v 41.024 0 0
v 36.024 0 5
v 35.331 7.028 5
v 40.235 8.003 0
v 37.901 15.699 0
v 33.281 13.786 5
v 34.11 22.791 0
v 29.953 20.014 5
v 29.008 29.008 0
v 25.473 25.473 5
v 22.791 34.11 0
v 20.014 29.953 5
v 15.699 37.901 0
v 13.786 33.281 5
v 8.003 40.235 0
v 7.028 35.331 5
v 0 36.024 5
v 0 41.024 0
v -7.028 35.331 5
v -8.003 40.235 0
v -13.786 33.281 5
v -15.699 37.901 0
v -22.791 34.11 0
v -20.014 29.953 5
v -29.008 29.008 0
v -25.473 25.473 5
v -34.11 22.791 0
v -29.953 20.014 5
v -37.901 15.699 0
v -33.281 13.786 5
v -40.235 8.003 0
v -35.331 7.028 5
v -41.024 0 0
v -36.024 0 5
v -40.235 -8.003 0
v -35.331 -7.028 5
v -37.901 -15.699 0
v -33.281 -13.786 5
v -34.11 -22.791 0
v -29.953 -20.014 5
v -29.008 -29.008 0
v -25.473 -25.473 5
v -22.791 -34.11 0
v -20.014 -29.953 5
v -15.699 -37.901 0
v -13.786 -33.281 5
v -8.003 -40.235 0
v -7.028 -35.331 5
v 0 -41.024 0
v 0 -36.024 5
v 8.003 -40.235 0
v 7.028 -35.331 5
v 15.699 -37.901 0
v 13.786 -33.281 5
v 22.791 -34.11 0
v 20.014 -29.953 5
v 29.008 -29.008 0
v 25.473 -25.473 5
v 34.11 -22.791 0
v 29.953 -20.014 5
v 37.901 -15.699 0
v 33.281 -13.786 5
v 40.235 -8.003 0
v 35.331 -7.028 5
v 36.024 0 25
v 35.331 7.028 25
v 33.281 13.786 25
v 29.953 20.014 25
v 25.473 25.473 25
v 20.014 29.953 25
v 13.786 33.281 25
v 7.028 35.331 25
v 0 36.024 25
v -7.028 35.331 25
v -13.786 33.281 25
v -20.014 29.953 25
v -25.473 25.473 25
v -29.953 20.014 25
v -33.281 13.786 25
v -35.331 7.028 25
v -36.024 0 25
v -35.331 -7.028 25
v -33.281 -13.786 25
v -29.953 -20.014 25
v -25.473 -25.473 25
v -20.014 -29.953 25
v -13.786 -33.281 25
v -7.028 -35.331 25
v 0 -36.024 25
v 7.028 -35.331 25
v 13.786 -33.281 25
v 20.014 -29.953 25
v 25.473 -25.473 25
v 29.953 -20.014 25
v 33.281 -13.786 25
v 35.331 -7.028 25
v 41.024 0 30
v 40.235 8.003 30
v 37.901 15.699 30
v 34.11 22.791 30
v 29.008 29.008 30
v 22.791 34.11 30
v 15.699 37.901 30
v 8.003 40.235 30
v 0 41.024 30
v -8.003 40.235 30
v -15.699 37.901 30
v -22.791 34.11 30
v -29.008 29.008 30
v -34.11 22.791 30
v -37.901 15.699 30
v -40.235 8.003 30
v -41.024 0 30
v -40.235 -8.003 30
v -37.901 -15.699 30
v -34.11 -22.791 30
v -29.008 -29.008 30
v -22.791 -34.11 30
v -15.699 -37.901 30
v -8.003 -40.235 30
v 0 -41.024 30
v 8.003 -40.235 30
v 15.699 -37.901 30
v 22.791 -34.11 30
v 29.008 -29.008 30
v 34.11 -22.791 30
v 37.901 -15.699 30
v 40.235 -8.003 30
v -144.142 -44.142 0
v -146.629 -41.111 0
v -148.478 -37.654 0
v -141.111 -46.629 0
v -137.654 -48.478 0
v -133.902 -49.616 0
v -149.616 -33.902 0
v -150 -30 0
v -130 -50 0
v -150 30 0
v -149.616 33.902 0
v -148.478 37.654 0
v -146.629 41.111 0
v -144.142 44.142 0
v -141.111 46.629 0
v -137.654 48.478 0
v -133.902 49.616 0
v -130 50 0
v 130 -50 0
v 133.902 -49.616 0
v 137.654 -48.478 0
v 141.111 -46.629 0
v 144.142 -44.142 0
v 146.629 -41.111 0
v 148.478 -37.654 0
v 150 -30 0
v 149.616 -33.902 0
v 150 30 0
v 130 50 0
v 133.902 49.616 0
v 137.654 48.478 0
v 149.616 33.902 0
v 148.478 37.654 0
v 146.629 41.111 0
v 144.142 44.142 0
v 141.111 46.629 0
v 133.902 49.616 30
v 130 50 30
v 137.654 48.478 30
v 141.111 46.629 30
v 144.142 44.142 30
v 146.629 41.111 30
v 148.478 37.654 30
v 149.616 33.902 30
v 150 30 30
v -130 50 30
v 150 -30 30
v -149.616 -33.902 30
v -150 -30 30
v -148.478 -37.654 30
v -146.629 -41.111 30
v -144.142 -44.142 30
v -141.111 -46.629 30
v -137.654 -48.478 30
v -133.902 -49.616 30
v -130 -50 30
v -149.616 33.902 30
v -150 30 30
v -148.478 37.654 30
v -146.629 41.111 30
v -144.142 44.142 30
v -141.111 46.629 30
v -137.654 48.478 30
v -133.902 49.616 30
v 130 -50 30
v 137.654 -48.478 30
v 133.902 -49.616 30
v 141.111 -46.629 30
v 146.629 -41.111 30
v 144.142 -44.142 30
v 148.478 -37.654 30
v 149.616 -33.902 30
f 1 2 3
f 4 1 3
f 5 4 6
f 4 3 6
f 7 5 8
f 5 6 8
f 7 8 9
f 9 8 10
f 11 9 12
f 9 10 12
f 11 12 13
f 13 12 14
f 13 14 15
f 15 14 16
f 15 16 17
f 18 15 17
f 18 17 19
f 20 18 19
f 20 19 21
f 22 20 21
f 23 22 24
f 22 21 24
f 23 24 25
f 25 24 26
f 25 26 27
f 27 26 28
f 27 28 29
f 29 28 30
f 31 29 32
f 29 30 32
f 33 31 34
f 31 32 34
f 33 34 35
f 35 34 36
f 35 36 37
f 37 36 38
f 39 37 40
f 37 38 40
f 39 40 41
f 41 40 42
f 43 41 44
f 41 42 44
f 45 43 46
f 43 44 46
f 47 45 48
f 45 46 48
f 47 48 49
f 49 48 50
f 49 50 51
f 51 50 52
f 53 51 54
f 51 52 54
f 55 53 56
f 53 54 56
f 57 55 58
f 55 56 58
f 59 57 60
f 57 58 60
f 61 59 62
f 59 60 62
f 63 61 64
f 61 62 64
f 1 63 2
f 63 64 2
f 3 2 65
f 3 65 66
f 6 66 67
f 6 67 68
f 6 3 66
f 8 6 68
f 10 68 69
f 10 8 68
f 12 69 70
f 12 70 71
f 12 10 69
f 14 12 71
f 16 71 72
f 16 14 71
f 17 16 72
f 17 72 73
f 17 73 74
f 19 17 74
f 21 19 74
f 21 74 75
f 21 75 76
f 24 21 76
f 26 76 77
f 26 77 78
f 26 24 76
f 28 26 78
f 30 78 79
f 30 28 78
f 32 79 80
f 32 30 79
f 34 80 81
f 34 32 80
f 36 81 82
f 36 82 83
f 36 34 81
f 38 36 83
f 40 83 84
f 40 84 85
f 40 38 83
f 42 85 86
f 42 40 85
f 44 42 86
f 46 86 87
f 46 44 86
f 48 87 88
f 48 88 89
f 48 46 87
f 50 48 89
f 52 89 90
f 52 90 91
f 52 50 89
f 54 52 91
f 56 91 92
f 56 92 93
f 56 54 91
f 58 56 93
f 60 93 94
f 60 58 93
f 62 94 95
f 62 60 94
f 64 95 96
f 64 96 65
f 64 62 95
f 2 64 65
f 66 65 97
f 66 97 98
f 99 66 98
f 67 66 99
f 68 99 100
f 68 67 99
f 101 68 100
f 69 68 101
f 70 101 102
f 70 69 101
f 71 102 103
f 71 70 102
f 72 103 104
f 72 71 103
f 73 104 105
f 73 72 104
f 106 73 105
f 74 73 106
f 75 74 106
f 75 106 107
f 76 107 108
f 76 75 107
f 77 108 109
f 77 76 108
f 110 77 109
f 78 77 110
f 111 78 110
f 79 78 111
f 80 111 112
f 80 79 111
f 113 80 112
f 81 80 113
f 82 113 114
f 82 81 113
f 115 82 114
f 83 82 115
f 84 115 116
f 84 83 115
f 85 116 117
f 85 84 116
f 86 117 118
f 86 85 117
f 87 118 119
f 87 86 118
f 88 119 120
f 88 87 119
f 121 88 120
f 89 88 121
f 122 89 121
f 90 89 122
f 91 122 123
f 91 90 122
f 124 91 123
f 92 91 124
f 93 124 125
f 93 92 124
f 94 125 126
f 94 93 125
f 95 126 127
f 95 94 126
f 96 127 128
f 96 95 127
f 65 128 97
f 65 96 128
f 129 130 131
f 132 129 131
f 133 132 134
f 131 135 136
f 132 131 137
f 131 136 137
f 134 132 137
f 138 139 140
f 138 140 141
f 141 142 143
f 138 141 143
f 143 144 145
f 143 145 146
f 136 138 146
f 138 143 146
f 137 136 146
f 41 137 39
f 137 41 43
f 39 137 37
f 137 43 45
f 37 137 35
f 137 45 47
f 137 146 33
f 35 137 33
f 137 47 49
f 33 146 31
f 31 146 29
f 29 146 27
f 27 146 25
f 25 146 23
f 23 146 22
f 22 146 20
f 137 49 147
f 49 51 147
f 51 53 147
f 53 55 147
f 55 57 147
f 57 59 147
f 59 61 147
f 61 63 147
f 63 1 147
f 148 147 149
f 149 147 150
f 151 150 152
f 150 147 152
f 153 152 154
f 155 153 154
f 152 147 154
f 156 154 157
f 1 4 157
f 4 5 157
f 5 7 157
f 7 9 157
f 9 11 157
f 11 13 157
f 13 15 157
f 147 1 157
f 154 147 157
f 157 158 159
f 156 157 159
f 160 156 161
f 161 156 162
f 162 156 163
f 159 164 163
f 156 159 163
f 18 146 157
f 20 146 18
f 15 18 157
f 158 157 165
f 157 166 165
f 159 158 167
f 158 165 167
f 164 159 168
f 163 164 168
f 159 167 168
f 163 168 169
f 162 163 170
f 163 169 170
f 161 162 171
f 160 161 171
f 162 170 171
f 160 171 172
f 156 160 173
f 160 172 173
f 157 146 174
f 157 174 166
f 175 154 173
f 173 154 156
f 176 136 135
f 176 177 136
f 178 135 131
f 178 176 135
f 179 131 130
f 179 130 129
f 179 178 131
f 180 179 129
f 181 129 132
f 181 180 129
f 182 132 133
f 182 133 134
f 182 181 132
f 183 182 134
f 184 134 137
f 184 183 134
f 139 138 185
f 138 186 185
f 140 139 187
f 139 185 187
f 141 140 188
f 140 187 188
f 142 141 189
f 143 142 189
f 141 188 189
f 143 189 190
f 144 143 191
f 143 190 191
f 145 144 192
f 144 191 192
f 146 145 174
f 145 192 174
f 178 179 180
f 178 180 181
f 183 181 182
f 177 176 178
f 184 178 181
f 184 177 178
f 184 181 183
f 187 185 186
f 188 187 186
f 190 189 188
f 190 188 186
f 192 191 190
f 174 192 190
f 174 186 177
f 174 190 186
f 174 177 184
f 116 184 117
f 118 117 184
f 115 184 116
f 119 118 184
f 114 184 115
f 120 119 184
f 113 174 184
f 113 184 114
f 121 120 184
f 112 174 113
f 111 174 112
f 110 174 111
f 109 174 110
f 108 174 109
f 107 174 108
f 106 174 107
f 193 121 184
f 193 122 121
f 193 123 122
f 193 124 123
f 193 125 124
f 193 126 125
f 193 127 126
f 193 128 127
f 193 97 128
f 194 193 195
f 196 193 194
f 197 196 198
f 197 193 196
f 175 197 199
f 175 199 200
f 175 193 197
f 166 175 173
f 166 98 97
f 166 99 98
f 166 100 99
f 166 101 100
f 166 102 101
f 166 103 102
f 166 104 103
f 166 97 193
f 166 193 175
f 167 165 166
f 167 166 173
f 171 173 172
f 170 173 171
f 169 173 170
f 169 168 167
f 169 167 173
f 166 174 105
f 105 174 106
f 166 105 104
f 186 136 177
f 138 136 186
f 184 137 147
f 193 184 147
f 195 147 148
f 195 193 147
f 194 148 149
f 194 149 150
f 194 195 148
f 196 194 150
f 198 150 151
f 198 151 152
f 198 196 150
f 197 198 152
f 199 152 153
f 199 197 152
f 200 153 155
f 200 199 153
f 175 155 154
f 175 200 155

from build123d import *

# Parameters (mm, degrees)
F0_W     = 300
F0_H     = 100
F0_R     = 36.023604
F1_DEPTH = 30
F2_R     = 20
F3_SIZE  = 5


with BuildPart() as f1:
    # F0 (on Top) → F1 (new body)
    with BuildSketch(Plane.XY):
        Rectangle(F0_W, F0_H)
        Circle(F0_R, mode=Mode.SUBTRACT)
    extrude(amount=F1_DEPTH)

    # F2
    f2_edges = [f1.edges().sort_by_distance(p)[0] for p in [
        (150, -50, 15),
        (150, 50, 15),
        (-150, -50, 15),
        (-150, 50, 15),
    ]]
    fillet(f2_edges, radius=F2_R)

    # F3
    f3_edges = [f1.edges().sort_by_distance(p)[0] for p in [
        (-36.023604, 0, 30),
        (-36.023604, 0, 0),
    ]]
    chamfer(f3_edges, length=F3_SIZE)


solid = f1.part
